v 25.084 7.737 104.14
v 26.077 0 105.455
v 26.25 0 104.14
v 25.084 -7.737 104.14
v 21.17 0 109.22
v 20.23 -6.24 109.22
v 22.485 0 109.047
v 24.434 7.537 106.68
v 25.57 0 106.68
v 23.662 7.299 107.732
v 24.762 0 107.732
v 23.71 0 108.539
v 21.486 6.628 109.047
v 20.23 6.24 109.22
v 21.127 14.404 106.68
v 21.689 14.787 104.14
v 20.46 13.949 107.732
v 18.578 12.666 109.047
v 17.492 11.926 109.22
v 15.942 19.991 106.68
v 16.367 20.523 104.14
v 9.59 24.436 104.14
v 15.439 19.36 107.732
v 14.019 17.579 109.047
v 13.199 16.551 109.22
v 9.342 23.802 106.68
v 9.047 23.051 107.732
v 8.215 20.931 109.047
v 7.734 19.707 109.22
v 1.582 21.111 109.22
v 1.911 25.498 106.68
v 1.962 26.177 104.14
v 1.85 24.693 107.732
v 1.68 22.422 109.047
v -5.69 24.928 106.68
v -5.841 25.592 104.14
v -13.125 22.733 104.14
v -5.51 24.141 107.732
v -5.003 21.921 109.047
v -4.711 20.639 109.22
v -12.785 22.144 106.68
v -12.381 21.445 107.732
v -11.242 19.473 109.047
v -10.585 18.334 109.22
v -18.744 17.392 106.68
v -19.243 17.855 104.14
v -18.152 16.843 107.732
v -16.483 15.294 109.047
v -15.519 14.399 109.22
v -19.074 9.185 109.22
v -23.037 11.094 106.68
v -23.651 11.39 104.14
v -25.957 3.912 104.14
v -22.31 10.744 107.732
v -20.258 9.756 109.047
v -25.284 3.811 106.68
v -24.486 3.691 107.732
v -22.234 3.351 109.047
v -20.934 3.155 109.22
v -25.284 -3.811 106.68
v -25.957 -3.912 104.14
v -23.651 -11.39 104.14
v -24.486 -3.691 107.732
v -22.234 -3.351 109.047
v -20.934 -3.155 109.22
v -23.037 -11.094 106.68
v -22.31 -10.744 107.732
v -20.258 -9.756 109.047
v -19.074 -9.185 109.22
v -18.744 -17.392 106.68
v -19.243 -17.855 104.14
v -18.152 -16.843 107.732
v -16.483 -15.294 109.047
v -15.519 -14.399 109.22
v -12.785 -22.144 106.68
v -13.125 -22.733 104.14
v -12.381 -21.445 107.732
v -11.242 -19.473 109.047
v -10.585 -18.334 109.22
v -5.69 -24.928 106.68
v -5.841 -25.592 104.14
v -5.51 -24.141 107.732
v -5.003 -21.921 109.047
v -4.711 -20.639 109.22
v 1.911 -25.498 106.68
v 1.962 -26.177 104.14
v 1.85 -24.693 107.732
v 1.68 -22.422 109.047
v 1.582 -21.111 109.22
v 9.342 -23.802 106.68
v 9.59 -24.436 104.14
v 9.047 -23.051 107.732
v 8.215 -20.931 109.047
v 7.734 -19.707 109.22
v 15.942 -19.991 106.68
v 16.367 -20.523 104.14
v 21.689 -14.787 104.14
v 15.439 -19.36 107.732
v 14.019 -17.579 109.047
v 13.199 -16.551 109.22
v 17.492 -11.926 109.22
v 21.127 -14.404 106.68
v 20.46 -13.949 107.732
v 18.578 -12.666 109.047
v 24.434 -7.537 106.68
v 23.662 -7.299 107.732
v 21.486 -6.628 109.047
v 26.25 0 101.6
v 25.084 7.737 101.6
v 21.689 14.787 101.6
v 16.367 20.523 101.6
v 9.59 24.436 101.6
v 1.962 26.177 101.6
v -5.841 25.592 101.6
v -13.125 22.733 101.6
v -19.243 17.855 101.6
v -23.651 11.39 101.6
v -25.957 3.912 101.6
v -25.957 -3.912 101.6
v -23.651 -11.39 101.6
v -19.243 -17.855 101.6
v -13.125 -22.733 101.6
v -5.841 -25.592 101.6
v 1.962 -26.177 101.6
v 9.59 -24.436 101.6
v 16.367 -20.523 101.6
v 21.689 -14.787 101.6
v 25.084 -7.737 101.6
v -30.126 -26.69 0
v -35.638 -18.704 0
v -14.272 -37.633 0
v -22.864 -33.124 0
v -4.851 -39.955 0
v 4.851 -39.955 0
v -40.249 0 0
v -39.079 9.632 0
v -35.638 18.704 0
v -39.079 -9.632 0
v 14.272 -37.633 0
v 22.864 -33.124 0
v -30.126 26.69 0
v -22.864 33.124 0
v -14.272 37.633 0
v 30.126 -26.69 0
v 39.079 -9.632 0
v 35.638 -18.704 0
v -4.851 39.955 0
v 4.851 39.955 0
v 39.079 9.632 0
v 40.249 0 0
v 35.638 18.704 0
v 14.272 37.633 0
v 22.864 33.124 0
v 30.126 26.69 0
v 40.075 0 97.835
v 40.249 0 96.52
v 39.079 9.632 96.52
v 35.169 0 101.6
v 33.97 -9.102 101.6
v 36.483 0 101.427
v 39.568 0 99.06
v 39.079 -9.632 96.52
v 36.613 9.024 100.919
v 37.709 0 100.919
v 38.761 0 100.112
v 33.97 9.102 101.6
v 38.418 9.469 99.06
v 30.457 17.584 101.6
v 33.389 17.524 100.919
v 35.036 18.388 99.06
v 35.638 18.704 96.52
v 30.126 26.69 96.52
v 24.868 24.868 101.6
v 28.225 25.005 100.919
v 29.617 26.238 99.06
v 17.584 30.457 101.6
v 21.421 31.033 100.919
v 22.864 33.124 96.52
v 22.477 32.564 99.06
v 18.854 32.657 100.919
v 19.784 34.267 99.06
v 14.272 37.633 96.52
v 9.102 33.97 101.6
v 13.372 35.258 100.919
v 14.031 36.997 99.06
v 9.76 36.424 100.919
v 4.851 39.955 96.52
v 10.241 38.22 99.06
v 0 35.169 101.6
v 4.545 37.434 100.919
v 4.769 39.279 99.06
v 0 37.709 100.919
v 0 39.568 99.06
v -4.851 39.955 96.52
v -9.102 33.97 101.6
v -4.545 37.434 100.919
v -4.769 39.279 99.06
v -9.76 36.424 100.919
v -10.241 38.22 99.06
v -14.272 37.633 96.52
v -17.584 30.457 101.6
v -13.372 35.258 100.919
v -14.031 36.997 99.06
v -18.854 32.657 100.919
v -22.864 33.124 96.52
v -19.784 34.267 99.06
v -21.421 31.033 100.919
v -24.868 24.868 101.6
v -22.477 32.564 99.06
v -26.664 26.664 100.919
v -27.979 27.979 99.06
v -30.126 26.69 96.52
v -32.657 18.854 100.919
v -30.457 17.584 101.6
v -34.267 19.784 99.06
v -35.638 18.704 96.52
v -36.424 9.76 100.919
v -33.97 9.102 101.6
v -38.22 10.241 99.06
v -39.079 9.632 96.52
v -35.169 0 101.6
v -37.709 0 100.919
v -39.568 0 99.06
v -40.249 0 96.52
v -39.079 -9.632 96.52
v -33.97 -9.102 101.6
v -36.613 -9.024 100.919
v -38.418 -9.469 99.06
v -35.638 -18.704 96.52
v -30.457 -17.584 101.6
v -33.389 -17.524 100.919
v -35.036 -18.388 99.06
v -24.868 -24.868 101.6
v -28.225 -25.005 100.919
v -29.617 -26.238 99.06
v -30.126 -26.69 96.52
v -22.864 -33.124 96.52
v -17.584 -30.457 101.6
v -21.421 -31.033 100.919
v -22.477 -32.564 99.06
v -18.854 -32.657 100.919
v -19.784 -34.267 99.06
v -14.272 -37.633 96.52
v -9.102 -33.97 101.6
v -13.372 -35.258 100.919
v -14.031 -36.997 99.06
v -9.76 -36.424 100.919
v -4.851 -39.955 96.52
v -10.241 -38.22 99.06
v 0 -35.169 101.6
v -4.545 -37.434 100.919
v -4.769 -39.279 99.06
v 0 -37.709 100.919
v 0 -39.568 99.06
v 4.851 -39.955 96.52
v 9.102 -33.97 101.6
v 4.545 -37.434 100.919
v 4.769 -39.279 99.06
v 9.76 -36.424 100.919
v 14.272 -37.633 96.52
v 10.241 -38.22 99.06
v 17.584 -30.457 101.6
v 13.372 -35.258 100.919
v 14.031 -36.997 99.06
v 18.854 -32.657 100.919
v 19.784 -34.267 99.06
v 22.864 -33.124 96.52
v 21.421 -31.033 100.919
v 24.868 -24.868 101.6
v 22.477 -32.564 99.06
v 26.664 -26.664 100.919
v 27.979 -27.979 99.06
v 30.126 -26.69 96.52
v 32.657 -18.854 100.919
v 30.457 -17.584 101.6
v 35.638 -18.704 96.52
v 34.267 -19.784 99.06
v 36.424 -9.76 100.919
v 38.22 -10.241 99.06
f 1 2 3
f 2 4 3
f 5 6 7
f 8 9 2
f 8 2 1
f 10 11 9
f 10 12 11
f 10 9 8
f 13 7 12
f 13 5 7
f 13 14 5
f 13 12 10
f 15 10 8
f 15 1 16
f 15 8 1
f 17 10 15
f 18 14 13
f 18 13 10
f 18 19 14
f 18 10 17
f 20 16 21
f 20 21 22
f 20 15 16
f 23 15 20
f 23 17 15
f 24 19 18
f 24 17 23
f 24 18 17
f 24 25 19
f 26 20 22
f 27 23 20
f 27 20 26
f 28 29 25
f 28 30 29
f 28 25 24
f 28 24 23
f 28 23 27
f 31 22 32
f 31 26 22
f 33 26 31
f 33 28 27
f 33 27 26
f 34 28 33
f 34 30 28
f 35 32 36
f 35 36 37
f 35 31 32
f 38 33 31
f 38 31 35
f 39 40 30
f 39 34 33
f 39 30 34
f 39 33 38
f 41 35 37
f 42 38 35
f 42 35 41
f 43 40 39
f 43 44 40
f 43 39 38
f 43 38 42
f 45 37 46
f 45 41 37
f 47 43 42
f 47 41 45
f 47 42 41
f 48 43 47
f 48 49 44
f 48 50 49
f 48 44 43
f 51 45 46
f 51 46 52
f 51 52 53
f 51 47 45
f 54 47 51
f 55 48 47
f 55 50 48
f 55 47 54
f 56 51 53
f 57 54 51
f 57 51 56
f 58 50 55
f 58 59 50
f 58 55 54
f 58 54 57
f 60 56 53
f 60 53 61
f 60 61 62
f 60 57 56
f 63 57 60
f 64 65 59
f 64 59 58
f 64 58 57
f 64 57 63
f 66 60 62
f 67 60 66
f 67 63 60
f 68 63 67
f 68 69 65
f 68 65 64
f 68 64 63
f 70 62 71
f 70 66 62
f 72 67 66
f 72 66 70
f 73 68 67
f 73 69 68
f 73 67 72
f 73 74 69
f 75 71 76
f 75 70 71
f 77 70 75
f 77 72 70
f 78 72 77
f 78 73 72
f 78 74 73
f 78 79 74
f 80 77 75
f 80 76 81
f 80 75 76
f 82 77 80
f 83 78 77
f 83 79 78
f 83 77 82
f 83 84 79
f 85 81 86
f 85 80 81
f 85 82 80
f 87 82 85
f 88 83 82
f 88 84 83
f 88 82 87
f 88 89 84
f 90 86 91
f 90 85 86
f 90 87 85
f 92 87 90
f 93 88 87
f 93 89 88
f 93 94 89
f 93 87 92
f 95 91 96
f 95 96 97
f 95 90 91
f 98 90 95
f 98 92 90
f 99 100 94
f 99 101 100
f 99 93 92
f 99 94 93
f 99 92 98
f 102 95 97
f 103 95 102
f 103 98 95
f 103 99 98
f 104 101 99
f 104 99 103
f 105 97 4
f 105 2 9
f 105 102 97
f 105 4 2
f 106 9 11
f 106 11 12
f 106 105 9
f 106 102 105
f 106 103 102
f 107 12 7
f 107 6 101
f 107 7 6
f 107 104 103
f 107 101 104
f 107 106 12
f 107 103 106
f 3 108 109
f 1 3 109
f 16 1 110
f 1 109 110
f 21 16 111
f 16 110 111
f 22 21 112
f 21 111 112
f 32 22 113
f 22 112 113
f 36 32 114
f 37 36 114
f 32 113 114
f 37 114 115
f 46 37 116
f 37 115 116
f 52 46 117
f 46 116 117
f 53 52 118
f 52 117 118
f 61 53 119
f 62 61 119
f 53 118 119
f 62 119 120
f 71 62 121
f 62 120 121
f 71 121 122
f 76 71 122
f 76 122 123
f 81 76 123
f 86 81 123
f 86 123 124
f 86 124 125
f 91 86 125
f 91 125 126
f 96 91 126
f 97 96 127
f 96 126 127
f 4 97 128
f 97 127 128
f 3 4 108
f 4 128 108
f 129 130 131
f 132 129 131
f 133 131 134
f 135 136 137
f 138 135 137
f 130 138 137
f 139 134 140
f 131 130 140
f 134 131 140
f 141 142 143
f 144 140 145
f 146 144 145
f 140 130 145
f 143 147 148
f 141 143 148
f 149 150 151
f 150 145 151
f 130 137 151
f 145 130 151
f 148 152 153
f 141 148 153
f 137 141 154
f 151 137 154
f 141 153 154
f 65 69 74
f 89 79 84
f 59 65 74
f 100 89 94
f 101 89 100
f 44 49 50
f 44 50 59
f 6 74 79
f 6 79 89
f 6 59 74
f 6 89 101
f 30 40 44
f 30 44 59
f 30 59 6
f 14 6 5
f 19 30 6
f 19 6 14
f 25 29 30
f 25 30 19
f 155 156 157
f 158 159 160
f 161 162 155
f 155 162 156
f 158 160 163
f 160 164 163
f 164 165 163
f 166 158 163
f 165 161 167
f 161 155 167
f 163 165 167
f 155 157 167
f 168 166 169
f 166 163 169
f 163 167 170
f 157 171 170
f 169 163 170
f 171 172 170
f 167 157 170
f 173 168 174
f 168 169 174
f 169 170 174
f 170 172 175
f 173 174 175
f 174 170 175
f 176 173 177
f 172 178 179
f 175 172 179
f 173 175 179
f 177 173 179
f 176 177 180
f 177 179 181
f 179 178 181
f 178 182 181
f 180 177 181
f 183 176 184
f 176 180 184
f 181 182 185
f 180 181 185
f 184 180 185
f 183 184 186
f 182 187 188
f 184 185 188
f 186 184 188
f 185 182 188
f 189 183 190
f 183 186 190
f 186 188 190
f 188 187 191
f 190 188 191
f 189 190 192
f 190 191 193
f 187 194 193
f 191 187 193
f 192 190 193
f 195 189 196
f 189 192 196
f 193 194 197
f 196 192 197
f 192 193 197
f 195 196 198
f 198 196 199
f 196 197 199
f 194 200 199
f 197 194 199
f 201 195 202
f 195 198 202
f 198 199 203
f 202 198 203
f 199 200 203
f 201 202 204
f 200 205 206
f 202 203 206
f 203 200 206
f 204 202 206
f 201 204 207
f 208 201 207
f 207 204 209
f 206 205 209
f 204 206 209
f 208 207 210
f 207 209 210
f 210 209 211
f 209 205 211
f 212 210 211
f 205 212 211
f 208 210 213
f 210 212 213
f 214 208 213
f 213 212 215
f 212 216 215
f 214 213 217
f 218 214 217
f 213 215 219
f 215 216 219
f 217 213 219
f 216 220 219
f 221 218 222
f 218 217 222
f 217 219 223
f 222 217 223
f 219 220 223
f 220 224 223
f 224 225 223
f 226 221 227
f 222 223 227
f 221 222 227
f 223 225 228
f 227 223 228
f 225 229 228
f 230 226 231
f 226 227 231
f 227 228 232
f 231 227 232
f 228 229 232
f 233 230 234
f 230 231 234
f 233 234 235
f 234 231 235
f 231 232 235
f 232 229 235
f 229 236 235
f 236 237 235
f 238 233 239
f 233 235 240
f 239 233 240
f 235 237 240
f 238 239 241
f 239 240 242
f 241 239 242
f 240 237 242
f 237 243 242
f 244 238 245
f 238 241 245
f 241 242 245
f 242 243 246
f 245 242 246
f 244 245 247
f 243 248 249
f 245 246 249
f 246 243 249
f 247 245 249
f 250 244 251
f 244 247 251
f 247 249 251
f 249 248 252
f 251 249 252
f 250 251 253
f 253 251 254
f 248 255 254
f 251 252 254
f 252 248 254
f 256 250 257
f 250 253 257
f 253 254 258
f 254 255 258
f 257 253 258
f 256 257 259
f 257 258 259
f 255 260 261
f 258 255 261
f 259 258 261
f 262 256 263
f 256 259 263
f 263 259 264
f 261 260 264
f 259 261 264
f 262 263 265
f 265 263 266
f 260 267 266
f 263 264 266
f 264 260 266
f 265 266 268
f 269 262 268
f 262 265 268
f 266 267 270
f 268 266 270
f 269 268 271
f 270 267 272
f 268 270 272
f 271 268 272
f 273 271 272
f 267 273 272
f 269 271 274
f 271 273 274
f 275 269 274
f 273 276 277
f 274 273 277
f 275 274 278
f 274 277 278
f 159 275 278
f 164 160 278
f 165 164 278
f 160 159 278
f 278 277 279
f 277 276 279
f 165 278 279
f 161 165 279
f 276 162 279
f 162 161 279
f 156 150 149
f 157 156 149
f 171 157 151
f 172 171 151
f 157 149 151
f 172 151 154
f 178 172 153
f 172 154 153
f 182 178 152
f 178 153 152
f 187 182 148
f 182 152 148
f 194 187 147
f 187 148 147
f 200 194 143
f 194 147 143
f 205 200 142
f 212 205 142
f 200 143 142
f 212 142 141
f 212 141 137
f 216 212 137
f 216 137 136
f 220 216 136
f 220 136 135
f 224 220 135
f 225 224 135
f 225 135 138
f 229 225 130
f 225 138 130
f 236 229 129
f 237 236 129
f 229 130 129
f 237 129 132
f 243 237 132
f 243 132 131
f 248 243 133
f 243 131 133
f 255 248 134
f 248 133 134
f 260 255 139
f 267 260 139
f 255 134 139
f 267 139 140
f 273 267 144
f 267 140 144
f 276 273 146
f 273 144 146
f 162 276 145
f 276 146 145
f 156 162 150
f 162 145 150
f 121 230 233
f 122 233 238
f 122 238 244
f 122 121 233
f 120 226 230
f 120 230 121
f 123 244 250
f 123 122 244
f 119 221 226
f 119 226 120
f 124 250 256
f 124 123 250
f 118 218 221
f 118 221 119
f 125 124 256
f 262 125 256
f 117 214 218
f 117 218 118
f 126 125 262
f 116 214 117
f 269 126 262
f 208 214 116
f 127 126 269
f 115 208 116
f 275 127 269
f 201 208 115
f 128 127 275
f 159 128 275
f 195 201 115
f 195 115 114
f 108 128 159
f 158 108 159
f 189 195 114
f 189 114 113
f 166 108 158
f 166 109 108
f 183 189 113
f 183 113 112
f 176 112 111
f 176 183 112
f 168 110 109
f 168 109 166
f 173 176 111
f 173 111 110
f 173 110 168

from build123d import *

# Parameters (mm, degrees)
F0_R     = 40.248504
F1_DEPTH = 101.6
F2_R     = 26.250154
F3_DEPTH = 7.62
F4_R     = 5.08
F5_R     = 5.08


with BuildPart() as f1:
    # F0 (on Top) → F1 (new body)
    with BuildSketch(Plane.XY):
        Circle(F0_R)
    extrude(amount=F1_DEPTH)

    # F2 (on face) → F3 (join)
    with BuildSketch(Plane.XY.offset(101.6)):
        Circle(F2_R)
    extrude(amount=F3_DEPTH)

    # F4
    f4_edges = [f1.edges().sort_by_distance(p)[0] for p in [
        (-26.250154, 0, 109.22),
    ]]
    fillet(f4_edges, radius=F4_R)

    # F5
    f5_edges = [f1.edges().sort_by_distance(p)[0] for p in [
        (-40.248504, 0, 101.6),
    ]]
    fillet(f5_edges, radius=F5_R)


solid = f1.part
